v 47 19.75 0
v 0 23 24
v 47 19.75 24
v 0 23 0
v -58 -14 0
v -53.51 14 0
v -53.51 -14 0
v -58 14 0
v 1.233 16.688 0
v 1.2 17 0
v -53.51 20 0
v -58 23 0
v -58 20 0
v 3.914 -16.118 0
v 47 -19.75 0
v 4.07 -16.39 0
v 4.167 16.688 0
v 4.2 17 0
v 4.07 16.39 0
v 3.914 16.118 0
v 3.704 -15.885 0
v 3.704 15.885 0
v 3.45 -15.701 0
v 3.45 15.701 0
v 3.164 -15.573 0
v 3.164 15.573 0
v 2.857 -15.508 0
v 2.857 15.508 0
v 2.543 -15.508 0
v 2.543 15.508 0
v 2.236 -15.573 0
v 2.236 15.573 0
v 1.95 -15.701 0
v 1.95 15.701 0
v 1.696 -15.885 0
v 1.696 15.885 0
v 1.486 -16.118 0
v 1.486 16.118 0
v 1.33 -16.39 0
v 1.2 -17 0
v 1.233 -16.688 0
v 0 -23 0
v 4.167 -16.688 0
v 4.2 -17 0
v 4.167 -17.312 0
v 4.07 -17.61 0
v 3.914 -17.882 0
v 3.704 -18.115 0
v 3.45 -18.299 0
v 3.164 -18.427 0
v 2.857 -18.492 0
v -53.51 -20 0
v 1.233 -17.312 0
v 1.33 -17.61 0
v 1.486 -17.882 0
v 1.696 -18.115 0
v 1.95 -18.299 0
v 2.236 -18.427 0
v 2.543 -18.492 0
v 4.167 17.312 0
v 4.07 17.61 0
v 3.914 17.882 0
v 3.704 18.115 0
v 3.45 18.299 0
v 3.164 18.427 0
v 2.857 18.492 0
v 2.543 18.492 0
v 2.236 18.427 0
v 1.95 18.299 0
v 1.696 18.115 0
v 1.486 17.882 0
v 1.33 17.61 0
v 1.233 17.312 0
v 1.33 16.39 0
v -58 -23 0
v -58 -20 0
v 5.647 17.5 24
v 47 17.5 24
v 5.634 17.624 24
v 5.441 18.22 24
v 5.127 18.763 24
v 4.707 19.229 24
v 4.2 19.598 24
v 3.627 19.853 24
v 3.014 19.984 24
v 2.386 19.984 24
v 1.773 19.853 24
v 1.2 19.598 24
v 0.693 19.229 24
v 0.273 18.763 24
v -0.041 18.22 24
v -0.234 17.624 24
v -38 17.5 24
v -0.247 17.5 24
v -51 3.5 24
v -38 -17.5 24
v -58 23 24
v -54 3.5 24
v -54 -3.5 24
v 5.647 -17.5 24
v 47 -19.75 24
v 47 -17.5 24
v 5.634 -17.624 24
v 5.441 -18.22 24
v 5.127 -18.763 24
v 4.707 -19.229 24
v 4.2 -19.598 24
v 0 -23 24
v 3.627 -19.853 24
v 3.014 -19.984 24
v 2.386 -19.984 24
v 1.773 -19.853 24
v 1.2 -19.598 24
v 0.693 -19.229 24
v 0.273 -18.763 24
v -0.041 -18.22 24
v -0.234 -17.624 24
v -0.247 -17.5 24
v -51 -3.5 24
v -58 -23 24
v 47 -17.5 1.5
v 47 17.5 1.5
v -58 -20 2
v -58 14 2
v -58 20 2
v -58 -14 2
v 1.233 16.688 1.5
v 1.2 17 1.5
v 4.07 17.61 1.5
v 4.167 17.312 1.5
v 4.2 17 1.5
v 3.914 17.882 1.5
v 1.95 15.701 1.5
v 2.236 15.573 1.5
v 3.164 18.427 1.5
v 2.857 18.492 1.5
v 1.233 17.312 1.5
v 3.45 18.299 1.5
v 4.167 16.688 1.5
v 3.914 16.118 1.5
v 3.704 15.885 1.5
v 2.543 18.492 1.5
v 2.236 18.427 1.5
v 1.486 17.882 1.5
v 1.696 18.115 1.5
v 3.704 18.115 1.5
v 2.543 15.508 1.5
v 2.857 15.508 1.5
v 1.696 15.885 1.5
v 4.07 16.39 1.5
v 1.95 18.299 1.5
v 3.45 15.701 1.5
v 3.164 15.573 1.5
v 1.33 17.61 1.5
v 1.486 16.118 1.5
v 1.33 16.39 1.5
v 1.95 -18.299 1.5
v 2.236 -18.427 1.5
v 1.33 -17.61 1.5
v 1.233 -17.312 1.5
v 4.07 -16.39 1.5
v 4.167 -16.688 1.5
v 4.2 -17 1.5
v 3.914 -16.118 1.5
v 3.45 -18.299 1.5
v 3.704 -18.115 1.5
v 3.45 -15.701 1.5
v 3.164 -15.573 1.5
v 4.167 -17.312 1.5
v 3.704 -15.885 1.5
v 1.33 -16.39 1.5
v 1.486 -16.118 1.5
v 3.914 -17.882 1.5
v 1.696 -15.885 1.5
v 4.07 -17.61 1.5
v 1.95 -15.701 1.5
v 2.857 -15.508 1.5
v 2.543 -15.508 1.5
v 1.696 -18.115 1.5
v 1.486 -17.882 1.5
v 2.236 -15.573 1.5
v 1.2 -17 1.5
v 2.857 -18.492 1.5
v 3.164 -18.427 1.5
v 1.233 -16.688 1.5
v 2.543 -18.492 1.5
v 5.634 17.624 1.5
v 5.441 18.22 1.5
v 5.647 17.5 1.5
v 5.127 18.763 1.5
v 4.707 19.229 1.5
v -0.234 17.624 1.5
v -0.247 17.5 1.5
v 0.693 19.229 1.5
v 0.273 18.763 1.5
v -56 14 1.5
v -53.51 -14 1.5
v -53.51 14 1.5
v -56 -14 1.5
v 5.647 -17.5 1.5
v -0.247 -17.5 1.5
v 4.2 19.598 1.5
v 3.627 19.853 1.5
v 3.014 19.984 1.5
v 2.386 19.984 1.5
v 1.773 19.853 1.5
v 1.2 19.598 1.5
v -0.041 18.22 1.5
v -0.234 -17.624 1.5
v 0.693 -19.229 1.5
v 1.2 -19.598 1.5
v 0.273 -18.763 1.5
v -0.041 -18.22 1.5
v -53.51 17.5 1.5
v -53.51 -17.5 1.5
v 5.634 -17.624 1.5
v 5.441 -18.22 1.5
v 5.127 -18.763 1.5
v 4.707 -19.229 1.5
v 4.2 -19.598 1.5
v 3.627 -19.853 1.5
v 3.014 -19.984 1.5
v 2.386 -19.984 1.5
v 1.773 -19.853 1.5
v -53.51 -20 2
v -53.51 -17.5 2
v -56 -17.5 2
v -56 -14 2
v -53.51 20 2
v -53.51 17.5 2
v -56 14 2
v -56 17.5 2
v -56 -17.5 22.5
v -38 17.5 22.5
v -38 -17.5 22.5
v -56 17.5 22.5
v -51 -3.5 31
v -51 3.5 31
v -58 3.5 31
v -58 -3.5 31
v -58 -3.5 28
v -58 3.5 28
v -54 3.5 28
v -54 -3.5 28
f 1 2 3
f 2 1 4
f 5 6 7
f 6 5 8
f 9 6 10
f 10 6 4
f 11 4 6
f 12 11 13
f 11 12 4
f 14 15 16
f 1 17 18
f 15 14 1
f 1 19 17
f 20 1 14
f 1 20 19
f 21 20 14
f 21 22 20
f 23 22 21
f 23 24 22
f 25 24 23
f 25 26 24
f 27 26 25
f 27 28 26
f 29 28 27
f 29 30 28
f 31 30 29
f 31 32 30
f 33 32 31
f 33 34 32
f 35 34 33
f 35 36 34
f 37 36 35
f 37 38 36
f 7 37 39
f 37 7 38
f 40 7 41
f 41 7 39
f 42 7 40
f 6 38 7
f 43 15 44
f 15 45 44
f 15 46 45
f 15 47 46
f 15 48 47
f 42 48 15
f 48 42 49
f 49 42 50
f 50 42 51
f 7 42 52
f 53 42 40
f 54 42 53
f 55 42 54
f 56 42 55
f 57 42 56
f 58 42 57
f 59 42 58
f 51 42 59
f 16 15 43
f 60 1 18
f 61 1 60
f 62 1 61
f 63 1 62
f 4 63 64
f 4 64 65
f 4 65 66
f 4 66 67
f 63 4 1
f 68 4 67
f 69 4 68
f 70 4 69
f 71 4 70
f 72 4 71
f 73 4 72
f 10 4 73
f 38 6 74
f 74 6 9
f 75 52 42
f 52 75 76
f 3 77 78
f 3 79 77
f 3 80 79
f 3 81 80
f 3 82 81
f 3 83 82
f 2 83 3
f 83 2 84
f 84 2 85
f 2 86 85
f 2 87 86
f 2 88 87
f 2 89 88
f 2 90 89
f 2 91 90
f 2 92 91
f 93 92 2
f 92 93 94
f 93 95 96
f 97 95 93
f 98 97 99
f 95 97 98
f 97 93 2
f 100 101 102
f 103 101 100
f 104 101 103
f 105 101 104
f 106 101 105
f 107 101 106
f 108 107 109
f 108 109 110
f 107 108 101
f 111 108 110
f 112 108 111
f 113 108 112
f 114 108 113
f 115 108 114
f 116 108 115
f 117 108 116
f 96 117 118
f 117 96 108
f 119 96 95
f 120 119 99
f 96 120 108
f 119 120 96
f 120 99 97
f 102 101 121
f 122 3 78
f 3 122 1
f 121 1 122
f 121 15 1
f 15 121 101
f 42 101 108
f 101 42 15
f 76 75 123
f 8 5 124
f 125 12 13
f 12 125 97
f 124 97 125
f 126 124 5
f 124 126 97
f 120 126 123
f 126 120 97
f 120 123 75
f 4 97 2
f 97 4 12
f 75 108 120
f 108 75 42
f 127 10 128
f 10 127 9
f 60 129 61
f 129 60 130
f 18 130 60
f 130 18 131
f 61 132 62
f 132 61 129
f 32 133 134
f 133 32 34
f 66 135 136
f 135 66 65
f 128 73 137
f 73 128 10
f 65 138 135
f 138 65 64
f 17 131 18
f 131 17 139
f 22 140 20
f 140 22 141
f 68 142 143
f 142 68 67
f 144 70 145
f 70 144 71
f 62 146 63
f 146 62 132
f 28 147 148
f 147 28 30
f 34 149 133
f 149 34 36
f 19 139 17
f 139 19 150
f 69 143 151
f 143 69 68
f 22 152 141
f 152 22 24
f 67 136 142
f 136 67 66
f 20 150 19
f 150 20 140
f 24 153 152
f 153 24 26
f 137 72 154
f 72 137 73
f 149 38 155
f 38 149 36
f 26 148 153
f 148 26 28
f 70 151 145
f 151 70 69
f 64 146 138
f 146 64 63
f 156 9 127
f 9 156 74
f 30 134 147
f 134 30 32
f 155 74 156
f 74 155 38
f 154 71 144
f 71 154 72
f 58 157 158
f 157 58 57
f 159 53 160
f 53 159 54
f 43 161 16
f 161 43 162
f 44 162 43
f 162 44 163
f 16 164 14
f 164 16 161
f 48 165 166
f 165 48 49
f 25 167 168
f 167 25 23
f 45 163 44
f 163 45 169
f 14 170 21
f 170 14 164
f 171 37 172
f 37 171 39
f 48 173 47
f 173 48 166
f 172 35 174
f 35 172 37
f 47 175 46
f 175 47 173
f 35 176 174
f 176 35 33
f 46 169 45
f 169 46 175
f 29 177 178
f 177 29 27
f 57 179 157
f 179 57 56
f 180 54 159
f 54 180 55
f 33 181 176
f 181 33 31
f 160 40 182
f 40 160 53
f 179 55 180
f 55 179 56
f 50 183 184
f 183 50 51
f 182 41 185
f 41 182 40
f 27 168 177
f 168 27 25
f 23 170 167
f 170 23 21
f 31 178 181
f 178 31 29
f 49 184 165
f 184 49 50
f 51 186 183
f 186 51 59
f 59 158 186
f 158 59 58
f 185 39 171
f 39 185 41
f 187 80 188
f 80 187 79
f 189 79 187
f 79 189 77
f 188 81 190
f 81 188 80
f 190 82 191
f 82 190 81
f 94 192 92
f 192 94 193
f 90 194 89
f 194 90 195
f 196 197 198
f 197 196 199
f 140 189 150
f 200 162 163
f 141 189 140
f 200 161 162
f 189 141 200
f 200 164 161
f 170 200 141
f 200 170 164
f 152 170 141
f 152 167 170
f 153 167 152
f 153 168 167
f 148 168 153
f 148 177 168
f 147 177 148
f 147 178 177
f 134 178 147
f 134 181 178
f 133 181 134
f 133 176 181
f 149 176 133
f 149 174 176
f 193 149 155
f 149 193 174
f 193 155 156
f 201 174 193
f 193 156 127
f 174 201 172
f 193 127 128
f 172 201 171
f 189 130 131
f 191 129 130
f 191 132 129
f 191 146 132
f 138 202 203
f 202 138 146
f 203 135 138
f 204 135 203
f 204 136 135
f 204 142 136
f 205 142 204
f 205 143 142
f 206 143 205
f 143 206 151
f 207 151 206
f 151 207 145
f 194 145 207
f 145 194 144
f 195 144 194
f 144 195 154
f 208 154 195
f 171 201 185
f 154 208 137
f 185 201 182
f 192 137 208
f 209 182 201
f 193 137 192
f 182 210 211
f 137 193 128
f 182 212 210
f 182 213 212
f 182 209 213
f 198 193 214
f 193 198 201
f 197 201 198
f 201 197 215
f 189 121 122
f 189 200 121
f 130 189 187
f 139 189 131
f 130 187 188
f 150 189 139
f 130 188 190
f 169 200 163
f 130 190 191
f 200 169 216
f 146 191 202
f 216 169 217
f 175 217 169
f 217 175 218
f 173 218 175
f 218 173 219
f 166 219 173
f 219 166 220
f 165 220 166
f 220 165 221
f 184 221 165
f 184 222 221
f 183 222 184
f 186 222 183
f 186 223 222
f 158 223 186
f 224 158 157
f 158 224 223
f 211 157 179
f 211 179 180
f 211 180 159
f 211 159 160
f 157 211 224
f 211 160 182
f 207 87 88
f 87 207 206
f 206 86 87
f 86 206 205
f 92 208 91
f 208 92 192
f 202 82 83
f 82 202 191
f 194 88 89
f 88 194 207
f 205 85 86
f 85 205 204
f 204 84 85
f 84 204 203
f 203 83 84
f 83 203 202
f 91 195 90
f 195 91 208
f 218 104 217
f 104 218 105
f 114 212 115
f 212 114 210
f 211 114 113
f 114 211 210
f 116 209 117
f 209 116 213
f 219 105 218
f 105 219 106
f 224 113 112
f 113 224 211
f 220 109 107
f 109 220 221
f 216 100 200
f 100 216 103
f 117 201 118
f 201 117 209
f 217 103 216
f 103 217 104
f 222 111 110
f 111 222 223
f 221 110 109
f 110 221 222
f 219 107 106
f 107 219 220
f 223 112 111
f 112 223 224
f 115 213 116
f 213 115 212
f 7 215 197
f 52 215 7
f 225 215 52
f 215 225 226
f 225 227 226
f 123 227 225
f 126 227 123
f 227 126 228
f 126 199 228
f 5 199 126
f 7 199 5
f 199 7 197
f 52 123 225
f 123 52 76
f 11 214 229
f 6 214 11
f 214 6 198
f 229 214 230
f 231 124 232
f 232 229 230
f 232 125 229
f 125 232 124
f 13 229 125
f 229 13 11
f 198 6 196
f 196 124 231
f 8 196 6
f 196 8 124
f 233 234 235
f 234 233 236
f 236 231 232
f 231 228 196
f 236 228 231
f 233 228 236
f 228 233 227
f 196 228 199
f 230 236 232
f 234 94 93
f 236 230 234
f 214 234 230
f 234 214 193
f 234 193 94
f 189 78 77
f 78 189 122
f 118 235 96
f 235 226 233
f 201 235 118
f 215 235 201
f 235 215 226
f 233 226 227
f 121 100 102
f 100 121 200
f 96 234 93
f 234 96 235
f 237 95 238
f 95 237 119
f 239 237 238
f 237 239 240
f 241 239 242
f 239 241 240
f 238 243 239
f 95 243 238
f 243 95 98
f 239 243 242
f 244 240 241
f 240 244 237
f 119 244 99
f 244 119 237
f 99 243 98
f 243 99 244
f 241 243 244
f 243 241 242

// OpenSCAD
include_strap_tab="Yes";//[Yes,No]
battery_height=21;//[1:100]
battery_width=35;//[1:36]
/* [Hidden] */
$fn=30;

frame_width_max=46;
frame_width_min=39.5;

module battery(){
    translate([-56,-battery_width/2,1.5]){
        cube([103.01,battery_width,battery_height]);
    }
}
module base_mount(){
    linear_extrude(height=battery_height+3)
        polygon(points=[[0,frame_width_max/2],[0,-frame_width_max/2],[47,-frame_width_min/2],[47,frame_width_min/2]],paths=[[0,1,2,3]]);
    translate([-58,-frame_width_max/2,0]){
    cube([58,frame_width_max,battery_height+3]);
    }
}
module strap_tab(){
    difference(){
        cube([7,7,7]);
        translate([-0.01,-0.01,-0.01])cube([4.01,7.02,4.01]);
    }
}
module screw_holes(){
    translate([2.7,17,-0.01])cylinder(h=1.52,r=1.5);
    translate([2.7,-17,-0.01])cylinder(h=1.52,r=1.5);
    translate([2.7,17,1.5])cylinder(h=battery_height+1.51,r=3);
    translate([2.7,-17,1.5])cylinder(h=battery_height+1.51,r=3);
    translate([-58.01,-20,-0.01])cube([4.5,6,2.01]);
    translate([-58.01,14,-0.01])cube([4.5,6,2.01]);
}
module top_hole(){
    translate([-38,-battery_width/2,battery_height+1.49])cube([85.01,battery_width,1.52]);
}
difference(){
    base_mount();
    screw_holes();
    battery();
    top_hole();
}
if (include_strap_tab=="Yes") {
    translate([-58,-3.5,battery_height+3])strap_tab();
}
